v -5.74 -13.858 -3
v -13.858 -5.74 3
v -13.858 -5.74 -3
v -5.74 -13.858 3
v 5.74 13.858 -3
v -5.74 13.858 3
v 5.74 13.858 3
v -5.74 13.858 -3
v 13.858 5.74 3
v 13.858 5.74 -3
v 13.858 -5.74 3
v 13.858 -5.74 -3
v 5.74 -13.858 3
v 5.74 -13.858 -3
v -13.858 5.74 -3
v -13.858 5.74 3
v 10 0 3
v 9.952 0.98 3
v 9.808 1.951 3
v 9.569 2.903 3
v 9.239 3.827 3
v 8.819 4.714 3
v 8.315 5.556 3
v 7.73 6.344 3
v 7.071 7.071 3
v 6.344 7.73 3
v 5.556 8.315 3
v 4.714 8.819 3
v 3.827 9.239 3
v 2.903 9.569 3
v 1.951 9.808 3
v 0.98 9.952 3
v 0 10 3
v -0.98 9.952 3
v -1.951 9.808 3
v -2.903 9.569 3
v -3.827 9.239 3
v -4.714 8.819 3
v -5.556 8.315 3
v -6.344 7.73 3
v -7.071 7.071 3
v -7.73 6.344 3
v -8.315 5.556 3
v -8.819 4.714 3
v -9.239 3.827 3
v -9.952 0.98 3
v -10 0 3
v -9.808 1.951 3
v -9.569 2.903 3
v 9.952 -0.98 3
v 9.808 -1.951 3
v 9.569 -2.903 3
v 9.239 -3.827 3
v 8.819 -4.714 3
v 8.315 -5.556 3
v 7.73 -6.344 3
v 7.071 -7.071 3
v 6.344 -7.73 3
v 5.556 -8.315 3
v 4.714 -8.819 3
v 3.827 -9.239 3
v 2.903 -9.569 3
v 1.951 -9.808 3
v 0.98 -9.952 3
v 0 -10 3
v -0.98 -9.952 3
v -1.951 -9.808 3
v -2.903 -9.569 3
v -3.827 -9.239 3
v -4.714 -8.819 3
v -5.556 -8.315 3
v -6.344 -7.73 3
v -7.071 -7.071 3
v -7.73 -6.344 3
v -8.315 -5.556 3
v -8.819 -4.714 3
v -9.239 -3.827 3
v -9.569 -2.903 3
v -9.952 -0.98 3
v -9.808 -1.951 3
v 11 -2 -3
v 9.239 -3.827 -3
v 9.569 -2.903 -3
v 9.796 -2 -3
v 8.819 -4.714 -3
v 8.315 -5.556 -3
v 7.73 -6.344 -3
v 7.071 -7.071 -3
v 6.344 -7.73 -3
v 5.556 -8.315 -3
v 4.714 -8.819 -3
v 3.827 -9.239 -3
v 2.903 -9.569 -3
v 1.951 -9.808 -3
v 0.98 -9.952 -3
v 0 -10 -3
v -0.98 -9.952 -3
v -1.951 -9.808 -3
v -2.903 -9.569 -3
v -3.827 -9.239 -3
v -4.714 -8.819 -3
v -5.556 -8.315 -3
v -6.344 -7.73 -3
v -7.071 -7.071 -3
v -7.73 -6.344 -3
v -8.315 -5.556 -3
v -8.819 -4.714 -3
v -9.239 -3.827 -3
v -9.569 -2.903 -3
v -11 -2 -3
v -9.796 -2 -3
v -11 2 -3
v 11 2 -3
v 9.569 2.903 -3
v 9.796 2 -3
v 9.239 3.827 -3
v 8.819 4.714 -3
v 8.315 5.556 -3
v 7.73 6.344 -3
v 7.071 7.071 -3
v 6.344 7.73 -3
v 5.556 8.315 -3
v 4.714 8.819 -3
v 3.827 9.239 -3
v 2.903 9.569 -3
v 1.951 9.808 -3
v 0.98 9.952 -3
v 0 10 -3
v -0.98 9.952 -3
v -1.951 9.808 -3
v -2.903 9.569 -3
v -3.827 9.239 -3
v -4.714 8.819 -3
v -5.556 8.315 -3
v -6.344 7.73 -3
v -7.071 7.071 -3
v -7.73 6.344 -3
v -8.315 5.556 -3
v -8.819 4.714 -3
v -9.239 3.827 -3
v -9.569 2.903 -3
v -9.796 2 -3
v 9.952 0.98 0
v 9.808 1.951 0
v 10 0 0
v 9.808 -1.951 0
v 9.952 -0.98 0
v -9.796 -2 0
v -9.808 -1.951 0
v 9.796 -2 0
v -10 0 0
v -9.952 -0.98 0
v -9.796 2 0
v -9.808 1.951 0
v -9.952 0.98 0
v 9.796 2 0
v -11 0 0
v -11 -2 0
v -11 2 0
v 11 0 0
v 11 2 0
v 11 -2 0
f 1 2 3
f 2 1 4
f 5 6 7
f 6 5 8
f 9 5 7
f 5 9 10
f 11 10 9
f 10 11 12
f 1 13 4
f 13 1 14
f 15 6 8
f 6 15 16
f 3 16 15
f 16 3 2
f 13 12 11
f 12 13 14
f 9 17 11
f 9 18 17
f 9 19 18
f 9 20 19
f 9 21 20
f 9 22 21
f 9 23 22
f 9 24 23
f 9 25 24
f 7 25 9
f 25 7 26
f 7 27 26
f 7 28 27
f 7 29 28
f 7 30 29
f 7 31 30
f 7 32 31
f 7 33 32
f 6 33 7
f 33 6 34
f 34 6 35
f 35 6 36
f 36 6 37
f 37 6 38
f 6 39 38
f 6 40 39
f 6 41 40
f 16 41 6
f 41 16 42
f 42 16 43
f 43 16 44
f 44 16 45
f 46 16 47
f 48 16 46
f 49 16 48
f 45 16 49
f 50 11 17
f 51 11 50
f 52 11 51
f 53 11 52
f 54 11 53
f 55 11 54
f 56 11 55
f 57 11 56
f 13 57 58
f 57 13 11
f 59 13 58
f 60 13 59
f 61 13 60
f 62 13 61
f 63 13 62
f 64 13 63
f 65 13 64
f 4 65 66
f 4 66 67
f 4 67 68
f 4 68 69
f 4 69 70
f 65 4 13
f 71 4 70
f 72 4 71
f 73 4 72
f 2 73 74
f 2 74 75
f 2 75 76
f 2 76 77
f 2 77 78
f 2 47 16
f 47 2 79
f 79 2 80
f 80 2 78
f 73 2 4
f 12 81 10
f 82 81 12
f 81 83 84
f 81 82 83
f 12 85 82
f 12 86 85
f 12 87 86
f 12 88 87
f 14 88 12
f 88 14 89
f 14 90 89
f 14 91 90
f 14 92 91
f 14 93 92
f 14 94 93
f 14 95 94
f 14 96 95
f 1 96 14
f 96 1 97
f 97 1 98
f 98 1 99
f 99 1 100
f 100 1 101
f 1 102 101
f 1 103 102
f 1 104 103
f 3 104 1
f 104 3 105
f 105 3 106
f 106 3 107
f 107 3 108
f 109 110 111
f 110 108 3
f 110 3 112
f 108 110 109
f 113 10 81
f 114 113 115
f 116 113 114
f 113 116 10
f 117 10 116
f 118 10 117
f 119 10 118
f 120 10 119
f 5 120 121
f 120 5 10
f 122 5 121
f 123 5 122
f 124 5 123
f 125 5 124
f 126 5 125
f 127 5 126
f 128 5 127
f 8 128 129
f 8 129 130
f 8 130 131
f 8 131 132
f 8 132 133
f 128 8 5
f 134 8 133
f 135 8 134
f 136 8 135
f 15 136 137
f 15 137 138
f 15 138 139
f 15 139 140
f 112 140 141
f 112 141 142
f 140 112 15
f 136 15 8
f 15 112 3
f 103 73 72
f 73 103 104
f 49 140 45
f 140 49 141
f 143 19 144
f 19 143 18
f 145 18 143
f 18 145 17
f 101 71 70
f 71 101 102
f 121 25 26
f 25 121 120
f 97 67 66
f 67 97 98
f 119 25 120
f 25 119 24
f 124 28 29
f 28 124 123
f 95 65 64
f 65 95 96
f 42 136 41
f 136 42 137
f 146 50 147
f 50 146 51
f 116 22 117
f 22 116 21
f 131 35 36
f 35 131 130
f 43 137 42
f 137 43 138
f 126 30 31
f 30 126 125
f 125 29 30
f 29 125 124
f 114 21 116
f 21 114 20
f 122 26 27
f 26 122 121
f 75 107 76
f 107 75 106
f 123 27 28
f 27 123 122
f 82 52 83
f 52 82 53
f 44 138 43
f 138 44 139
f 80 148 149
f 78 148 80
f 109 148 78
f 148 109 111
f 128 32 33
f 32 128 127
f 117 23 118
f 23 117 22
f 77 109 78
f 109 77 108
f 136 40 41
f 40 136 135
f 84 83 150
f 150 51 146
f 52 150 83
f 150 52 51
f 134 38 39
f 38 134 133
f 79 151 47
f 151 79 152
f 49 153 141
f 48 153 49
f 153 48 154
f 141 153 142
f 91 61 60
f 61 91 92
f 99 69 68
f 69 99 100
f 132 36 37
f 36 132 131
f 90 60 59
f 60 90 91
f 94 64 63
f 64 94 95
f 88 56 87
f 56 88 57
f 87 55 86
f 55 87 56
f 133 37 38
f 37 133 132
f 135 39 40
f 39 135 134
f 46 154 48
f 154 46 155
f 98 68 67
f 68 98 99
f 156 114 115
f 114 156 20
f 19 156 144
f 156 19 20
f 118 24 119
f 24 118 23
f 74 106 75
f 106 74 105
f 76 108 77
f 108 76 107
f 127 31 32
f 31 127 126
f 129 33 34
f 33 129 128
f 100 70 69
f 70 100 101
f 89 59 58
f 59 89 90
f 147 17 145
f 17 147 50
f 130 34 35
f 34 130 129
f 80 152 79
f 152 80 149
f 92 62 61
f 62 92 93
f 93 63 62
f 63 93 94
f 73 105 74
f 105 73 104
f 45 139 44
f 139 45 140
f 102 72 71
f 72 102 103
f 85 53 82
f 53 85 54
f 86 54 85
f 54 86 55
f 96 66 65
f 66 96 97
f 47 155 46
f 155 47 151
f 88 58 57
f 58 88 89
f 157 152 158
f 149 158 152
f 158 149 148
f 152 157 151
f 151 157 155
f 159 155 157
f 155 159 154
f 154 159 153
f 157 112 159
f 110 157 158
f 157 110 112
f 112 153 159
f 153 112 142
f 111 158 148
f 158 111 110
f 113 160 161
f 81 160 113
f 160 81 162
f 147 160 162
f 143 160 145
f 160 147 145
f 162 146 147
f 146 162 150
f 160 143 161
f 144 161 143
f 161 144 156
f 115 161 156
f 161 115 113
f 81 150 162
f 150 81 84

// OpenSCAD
module octagonal_ring() {
    difference() {
        // Outer octagonal shape
        scale([1, 1, 0.2])
            rotate([0, 0, 22.5])
                cylinder(r=15, h=30, $fn=8);
        
        // Inner circular bore
        translate([0, 0, -1])
            cylinder(r=10, h=8, $fn=64);
        
        // Keyway notches
        translate([-10, 0, -1])
            cube([2, 4, 8], center=true);
        translate([10, 0, -1])
            cube([2, 4, 8], center=true);
    }
}

module pins() {
    // Cylindrical pins
    translate([-12, 0, 3])
        cylinder(r=1, h=3, $fn=64);
    translate([12, 0, 3])
        cylinder(r=1, h=3, $fn=64);
}

translate([0, 0, -3])
    union() {
        octagonal_ring();
        pins();
    }
